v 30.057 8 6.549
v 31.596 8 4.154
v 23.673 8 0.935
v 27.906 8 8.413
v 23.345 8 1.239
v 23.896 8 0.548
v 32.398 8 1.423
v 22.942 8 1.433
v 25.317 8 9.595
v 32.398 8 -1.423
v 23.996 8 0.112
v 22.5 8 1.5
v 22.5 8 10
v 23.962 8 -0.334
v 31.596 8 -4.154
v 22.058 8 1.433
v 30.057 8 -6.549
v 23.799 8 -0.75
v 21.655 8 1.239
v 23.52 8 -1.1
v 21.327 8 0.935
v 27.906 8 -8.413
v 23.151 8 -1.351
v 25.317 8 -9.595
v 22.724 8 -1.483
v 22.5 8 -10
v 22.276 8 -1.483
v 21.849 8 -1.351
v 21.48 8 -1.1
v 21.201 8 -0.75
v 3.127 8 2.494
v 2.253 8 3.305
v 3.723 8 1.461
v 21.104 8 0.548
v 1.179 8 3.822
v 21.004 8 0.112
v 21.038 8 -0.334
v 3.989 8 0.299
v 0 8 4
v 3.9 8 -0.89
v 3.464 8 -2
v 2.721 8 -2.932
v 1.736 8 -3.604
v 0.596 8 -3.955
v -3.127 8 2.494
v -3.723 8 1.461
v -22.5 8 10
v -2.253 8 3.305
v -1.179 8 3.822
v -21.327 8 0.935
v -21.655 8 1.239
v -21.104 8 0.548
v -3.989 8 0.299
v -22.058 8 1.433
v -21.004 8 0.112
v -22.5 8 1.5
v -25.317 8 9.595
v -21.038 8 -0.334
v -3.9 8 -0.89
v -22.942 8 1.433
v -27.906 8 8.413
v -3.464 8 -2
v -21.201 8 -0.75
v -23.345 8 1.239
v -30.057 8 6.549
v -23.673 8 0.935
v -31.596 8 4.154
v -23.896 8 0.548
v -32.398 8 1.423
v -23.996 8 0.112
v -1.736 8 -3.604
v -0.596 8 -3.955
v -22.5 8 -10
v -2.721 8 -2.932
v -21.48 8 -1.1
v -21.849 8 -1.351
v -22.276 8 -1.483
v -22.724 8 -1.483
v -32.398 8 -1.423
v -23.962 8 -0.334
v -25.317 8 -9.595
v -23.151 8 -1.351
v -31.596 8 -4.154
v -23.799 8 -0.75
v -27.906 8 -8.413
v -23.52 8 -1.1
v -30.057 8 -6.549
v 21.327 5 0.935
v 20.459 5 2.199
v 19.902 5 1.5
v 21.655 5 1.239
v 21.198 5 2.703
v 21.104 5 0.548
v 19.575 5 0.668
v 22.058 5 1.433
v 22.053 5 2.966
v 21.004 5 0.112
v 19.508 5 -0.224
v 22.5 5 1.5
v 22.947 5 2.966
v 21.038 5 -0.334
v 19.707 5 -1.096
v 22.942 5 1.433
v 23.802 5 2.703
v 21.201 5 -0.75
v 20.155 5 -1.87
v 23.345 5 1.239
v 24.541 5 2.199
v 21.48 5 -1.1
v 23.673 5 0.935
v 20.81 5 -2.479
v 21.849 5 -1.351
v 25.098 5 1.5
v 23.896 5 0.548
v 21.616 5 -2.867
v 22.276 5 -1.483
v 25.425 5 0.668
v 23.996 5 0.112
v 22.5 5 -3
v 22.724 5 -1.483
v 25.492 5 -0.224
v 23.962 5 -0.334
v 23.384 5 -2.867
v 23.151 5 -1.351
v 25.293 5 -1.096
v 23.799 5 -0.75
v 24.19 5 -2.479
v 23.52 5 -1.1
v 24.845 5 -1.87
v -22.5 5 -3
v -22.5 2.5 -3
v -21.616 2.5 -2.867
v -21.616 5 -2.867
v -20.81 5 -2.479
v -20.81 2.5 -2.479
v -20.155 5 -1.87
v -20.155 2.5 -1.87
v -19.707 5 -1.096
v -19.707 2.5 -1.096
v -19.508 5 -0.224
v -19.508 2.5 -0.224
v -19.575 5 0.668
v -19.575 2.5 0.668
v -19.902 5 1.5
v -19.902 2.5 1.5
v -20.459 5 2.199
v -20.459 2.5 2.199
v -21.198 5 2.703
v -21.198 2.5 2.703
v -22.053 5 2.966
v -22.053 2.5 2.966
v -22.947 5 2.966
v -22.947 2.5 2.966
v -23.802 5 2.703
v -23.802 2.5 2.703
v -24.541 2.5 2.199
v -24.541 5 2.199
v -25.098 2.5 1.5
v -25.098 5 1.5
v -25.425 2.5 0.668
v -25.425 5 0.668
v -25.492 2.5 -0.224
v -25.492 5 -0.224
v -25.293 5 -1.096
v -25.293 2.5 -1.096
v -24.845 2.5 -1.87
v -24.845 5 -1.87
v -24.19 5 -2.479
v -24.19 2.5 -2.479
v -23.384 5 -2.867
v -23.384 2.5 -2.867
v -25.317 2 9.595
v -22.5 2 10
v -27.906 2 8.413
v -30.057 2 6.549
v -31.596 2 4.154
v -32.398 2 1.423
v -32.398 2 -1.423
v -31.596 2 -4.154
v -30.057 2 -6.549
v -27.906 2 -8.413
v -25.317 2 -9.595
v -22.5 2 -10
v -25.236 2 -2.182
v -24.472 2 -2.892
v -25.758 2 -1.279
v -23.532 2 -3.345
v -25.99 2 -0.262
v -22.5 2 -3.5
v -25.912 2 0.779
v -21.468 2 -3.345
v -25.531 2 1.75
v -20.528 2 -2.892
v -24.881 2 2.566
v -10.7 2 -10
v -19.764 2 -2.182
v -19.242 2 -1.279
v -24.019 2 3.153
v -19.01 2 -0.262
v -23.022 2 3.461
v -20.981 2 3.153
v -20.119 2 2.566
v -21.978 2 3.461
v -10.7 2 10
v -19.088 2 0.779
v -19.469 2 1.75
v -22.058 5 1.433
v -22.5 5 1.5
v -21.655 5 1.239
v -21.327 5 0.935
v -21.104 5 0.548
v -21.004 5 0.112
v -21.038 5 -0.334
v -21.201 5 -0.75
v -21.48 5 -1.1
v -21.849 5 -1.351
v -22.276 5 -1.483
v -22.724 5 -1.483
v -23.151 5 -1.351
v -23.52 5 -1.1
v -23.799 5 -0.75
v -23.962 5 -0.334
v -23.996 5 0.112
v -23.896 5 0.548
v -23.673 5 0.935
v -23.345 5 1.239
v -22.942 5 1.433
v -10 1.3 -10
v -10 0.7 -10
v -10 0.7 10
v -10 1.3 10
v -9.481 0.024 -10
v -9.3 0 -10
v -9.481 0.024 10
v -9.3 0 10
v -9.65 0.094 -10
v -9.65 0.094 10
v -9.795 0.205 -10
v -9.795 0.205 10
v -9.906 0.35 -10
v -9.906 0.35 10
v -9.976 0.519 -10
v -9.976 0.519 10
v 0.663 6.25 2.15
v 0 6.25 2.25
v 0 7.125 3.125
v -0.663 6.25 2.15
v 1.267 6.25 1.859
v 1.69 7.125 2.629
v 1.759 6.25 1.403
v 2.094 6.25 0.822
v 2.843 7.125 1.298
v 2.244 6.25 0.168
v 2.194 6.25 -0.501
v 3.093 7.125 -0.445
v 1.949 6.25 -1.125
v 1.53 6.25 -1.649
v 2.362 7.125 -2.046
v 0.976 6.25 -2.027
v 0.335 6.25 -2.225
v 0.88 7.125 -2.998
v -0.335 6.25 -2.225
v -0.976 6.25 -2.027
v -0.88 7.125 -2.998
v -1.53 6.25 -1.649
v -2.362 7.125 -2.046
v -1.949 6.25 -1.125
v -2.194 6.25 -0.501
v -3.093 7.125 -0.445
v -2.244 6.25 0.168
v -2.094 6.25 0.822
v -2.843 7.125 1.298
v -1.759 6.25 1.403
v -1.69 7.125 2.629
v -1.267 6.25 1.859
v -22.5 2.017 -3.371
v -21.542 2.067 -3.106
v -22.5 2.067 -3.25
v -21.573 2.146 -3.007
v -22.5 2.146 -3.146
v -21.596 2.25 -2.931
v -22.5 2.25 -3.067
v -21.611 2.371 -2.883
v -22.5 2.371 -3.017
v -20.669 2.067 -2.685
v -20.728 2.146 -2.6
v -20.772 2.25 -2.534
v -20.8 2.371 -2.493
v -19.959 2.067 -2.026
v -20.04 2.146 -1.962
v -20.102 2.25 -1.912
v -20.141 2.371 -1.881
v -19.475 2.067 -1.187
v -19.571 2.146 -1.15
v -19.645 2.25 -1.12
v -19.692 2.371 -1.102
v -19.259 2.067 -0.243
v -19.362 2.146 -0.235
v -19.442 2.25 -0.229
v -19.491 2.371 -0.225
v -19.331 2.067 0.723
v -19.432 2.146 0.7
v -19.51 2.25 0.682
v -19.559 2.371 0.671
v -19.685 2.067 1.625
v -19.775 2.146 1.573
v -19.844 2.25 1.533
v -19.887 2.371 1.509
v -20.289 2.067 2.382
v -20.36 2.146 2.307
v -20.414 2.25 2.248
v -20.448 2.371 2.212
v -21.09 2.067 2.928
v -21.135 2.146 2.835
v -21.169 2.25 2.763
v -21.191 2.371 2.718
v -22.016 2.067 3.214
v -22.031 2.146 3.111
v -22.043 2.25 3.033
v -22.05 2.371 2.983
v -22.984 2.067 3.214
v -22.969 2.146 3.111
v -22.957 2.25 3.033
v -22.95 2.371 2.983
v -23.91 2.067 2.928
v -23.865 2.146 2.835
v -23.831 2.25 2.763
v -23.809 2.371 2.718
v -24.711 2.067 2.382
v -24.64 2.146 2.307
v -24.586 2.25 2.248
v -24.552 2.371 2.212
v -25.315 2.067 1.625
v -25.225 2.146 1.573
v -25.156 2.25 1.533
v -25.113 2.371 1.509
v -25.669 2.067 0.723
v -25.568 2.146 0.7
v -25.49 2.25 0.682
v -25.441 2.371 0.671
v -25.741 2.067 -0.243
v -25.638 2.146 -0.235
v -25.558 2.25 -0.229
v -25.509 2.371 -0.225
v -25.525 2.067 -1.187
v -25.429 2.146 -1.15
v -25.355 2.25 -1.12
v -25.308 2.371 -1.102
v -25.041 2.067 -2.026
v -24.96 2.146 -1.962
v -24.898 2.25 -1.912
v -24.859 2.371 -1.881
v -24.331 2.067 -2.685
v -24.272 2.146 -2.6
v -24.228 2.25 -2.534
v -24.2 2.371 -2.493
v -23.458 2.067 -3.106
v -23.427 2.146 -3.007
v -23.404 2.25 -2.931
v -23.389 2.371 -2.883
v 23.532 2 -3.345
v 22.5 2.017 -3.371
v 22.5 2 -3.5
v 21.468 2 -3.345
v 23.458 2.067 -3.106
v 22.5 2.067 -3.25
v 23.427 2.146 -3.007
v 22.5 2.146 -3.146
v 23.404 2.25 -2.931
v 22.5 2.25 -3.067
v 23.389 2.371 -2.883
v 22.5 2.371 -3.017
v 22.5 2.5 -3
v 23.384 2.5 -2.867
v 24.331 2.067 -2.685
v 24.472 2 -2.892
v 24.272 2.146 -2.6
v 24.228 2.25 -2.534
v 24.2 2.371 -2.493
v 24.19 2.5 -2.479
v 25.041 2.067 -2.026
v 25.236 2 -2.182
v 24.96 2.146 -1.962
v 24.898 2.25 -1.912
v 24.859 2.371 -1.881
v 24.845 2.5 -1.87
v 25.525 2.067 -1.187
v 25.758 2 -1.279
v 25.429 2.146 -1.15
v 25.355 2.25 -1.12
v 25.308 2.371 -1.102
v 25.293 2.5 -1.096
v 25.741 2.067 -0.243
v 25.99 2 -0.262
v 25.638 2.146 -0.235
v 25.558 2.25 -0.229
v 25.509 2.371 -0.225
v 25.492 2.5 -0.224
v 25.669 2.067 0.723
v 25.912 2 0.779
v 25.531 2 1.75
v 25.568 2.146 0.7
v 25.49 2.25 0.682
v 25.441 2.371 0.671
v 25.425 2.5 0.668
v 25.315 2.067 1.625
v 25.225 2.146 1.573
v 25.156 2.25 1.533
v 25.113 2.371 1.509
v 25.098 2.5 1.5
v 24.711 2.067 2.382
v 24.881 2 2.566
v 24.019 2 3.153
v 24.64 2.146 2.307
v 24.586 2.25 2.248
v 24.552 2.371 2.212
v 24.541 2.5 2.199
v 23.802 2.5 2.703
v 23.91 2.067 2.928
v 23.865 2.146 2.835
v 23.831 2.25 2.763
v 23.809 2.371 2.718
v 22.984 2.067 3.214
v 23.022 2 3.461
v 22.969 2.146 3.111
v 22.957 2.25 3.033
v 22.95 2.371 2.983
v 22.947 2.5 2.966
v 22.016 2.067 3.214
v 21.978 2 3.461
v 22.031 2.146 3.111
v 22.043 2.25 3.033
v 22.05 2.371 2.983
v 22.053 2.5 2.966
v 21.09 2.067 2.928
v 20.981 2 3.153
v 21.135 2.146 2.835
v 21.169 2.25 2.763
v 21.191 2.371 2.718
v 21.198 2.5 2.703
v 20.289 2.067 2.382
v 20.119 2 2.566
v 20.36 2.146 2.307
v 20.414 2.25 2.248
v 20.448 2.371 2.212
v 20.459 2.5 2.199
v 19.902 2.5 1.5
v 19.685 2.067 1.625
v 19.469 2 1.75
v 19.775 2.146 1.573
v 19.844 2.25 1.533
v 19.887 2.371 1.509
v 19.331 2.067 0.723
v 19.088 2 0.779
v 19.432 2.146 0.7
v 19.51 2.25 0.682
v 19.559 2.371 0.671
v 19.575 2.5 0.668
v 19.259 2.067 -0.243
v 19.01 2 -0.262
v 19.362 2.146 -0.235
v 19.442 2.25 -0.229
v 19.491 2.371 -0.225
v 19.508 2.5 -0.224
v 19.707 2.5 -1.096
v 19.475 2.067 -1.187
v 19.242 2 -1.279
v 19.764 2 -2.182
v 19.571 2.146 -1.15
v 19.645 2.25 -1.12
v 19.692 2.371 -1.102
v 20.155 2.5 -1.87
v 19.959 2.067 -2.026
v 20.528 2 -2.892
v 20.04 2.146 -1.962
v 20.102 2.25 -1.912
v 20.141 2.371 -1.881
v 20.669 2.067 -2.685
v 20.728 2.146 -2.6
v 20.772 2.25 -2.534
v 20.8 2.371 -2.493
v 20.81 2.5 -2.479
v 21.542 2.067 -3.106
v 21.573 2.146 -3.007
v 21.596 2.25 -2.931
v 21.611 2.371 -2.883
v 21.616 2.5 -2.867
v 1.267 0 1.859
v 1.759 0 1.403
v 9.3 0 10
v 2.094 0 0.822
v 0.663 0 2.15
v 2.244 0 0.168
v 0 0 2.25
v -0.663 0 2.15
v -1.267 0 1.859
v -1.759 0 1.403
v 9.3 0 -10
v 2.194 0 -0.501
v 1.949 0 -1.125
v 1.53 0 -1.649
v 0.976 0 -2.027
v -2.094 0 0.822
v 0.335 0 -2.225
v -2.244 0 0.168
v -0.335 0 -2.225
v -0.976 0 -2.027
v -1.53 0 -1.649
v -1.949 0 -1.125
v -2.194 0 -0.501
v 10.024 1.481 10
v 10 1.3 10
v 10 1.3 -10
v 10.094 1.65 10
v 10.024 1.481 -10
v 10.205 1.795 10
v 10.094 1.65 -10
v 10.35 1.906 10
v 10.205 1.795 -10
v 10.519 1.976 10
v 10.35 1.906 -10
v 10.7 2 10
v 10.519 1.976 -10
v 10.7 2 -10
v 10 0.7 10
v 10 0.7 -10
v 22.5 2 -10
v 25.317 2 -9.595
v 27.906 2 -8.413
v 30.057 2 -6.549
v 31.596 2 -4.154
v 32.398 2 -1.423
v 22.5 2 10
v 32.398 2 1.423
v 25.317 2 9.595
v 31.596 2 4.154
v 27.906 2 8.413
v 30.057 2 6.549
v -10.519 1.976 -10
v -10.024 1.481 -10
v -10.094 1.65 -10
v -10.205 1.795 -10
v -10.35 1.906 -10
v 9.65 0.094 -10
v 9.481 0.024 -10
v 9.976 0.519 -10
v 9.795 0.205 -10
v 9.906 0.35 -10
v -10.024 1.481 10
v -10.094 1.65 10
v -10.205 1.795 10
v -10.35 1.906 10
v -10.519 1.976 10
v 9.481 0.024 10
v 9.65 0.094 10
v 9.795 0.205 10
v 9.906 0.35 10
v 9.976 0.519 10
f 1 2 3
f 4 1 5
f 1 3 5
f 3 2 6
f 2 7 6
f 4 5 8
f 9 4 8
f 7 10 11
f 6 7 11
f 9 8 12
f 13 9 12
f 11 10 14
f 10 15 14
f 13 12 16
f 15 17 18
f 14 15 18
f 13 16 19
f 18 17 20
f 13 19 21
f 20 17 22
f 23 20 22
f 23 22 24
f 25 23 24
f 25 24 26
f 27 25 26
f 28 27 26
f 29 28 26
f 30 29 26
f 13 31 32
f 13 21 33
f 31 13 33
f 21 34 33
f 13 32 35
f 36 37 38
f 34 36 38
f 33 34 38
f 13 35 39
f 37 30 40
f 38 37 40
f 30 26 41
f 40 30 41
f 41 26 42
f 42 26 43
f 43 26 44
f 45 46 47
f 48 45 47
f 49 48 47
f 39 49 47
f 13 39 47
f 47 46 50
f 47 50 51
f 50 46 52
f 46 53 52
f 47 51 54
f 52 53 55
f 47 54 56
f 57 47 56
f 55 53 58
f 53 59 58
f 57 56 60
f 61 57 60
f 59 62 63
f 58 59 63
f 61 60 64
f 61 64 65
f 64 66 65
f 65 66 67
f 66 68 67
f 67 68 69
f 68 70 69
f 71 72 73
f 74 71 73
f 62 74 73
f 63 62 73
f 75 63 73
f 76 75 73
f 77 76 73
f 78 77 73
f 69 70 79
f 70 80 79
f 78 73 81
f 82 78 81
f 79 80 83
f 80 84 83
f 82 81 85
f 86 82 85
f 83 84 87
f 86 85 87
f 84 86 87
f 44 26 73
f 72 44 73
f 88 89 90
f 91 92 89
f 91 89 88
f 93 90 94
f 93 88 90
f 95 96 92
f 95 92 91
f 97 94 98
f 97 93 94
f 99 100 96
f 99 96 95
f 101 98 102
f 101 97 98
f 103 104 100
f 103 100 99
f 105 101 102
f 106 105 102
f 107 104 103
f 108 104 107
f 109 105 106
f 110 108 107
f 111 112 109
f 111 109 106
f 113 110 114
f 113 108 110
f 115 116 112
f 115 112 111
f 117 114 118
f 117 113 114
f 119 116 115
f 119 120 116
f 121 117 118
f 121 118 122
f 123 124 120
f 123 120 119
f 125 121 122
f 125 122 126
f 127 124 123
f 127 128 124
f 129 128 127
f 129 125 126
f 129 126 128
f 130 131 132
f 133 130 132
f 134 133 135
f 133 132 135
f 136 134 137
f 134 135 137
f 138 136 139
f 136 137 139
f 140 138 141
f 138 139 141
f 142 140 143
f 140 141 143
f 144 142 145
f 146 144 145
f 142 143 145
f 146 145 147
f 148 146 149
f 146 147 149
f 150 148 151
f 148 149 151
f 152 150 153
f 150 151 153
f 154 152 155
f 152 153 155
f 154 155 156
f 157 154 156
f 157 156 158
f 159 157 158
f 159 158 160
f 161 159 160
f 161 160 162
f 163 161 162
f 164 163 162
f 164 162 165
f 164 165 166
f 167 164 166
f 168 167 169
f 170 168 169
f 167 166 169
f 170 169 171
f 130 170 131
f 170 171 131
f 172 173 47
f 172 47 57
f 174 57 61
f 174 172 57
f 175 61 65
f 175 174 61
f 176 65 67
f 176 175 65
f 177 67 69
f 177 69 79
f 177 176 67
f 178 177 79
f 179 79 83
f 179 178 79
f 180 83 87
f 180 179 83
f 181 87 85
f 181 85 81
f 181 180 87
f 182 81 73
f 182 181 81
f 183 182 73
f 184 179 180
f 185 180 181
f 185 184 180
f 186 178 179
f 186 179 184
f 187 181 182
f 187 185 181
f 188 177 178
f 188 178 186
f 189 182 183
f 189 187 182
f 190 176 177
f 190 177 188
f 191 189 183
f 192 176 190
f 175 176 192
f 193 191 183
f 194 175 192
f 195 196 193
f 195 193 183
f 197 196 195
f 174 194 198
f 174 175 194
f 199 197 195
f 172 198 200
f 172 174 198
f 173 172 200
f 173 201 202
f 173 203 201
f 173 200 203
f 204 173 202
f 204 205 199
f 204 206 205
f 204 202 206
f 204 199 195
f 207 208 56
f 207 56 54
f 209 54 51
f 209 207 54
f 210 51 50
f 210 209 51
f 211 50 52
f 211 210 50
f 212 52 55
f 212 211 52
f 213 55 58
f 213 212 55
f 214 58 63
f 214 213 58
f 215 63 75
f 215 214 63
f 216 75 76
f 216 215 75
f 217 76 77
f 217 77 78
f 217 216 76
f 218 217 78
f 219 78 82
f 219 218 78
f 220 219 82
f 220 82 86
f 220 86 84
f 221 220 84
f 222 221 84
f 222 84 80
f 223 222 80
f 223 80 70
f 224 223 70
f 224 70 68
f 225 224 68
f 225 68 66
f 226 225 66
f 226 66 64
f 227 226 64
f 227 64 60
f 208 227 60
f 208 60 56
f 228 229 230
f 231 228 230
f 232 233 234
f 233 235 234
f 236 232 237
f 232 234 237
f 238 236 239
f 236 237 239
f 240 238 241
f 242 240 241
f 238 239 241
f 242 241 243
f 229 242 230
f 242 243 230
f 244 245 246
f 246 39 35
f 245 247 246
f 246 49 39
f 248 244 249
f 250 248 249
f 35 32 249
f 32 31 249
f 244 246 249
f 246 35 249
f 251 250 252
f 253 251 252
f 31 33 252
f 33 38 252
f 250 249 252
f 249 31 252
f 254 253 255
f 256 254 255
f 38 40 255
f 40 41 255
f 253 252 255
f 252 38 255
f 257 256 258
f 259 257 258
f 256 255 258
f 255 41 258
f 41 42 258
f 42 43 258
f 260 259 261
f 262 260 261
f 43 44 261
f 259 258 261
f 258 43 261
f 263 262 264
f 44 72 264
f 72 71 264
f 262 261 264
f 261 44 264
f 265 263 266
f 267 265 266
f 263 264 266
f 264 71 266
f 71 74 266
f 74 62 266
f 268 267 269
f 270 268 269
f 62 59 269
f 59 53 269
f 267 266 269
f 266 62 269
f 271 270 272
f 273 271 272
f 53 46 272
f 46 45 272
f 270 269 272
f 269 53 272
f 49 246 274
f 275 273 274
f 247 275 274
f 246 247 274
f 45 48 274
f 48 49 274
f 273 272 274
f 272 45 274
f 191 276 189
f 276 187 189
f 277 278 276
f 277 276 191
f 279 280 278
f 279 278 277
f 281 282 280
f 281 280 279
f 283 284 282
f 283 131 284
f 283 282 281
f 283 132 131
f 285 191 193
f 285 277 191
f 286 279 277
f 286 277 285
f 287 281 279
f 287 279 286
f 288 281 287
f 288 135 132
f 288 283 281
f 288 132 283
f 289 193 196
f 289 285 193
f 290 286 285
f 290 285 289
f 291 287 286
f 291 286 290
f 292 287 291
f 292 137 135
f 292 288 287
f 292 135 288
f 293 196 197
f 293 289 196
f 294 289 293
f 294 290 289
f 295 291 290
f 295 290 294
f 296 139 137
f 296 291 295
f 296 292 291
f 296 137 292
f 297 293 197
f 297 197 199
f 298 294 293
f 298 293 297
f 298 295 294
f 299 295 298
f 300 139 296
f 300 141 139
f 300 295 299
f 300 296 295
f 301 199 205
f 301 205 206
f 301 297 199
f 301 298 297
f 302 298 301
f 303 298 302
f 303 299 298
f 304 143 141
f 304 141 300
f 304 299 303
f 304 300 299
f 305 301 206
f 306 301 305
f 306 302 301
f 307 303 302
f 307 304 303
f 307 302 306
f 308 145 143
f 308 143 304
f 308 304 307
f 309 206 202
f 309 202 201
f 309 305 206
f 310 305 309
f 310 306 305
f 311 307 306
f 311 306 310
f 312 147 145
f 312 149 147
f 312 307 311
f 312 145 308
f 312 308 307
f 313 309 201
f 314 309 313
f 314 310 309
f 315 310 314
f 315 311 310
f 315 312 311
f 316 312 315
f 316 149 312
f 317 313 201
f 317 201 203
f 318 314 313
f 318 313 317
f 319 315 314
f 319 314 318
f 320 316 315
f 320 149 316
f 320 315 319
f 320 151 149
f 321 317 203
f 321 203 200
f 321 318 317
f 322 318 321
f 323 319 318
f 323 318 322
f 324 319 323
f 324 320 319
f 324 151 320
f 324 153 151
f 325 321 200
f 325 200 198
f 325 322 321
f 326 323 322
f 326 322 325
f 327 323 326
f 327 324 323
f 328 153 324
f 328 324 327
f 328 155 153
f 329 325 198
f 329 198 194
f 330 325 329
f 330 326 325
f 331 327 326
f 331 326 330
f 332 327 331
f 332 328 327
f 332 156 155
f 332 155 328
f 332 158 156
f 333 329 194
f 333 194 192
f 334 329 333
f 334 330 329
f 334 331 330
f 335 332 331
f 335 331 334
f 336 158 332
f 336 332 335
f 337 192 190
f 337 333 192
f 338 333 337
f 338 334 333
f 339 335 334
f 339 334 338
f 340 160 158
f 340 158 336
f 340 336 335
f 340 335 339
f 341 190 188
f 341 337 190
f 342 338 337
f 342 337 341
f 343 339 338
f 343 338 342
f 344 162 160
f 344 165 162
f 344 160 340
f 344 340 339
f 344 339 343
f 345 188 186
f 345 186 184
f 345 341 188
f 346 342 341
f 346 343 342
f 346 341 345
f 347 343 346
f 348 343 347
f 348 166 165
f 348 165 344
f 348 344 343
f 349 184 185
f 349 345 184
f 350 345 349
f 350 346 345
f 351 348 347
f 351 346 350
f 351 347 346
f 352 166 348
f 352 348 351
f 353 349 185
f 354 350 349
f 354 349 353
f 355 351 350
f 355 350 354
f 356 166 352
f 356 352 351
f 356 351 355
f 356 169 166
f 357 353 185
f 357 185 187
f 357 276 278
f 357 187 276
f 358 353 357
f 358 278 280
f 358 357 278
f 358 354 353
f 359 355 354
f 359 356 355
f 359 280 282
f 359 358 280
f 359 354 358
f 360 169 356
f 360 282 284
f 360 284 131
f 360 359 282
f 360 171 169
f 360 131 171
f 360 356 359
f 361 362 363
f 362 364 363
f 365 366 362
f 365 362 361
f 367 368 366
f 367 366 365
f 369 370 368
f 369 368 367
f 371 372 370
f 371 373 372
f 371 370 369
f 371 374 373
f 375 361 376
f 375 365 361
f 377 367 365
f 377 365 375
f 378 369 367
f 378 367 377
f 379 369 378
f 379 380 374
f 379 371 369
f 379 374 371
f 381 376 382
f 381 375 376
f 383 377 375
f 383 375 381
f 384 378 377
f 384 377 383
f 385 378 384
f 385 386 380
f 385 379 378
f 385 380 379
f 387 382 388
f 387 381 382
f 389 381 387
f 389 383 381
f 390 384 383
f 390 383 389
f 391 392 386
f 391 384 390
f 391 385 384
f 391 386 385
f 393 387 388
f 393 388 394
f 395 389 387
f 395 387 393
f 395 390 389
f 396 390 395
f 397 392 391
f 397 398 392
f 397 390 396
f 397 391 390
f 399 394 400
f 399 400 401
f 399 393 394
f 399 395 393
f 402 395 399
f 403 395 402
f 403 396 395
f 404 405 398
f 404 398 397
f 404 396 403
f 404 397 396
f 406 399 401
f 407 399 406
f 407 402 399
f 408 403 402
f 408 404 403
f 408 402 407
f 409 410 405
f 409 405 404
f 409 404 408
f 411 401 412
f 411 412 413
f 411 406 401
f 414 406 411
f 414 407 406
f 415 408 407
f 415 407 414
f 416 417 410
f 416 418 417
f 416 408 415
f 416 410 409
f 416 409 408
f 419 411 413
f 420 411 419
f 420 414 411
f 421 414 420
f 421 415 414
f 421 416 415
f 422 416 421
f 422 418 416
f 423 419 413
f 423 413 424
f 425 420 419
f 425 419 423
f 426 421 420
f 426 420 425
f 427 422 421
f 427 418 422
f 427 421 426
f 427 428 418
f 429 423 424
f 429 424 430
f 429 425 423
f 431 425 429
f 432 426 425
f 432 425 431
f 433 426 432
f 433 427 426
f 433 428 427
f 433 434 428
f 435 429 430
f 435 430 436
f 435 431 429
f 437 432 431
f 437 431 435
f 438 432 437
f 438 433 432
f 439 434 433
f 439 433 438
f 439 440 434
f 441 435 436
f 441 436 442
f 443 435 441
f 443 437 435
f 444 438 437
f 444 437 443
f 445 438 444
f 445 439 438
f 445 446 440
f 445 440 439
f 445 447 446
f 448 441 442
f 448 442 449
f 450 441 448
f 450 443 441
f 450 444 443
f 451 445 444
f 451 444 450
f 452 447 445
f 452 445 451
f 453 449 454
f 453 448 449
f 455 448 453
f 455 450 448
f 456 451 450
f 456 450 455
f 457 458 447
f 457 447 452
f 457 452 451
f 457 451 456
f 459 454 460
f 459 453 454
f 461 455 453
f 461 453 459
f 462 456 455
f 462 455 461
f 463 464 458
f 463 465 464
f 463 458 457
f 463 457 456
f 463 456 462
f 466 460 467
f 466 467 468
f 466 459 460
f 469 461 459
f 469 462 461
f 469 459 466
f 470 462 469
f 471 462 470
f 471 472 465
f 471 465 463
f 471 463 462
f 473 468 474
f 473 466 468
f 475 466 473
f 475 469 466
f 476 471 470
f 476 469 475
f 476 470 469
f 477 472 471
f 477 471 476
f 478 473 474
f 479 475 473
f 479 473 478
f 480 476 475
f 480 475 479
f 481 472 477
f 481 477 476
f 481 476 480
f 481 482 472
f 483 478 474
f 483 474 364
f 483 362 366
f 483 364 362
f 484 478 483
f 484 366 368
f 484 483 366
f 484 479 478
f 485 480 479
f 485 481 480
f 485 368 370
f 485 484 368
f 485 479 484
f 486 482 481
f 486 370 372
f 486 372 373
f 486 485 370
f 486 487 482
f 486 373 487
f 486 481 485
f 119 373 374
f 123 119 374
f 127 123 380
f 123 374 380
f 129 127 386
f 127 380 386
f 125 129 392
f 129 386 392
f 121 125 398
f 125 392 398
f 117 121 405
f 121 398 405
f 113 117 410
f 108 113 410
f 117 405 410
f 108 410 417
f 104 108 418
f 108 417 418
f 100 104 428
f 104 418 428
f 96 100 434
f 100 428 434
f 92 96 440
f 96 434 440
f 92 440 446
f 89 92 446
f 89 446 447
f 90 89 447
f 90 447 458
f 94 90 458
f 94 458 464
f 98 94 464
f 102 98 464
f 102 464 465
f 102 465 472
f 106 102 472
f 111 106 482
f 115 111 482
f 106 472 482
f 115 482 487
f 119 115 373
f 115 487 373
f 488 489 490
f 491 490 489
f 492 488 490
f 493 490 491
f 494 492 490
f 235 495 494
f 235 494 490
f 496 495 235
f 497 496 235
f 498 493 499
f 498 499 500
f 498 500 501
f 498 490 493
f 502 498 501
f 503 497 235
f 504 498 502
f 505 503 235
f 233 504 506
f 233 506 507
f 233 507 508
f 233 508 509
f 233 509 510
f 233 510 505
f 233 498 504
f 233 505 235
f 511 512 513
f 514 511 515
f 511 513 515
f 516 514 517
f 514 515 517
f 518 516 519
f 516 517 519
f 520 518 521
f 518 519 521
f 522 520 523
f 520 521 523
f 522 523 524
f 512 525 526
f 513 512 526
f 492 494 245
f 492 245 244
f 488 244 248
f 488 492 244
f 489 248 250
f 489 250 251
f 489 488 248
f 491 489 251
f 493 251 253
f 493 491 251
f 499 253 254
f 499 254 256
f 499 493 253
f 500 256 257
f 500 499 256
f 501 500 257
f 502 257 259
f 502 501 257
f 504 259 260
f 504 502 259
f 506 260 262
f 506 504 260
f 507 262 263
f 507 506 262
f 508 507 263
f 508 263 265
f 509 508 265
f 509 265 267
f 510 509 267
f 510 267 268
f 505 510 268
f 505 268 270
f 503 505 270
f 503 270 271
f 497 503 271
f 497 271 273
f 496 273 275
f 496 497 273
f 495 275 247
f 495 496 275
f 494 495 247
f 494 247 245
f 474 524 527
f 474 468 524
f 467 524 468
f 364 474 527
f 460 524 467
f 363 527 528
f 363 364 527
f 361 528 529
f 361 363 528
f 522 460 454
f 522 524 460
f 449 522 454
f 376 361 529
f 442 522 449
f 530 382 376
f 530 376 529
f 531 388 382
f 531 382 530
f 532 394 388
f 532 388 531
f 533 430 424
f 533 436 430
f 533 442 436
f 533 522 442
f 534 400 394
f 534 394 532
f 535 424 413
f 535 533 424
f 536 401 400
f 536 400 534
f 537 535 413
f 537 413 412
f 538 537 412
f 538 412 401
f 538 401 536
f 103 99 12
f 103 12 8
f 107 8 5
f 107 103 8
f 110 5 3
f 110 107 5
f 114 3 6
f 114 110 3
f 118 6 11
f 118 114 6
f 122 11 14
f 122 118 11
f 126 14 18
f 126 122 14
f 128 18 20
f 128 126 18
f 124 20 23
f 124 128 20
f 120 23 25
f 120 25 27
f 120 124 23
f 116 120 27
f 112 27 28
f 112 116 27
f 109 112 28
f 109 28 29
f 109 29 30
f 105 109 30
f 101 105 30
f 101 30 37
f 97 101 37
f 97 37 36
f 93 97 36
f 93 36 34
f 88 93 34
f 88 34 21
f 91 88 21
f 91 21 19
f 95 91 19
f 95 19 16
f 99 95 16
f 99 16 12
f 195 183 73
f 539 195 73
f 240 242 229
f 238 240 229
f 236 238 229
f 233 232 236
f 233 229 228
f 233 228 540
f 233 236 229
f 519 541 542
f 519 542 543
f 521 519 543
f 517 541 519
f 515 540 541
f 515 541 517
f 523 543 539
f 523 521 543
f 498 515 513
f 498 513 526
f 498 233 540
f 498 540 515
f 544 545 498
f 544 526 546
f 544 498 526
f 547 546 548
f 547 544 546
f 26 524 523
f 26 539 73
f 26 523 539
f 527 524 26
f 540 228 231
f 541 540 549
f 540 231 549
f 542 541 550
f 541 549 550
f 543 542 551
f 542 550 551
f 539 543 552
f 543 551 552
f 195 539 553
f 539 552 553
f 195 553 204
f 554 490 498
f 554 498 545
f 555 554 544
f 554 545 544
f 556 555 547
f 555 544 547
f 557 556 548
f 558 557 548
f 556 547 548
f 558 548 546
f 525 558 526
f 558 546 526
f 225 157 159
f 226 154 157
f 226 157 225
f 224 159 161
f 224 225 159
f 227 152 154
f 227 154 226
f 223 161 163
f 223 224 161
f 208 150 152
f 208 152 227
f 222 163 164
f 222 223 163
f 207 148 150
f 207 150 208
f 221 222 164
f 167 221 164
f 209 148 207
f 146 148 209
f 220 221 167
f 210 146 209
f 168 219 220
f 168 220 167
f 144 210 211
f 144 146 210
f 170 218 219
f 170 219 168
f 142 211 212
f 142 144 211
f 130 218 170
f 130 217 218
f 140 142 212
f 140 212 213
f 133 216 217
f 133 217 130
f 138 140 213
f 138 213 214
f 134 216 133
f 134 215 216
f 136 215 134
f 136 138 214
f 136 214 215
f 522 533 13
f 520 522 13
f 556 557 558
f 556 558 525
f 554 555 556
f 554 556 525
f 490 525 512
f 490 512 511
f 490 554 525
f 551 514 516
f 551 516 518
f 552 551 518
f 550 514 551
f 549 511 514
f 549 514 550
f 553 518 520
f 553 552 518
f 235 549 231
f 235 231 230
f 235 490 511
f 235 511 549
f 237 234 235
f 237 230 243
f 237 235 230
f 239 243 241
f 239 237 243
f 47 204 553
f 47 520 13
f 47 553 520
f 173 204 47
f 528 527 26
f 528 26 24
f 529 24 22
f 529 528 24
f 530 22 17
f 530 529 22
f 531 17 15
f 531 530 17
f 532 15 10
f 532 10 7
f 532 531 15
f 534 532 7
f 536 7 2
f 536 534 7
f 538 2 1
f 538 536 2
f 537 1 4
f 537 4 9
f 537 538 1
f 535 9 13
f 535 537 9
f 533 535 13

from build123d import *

# Parameters (mm, degrees)
SKETCH1_R           = 1.5
SKETCH1_R_2         = 2.25
BOSS_EXTRUDE1_DEPTH = 8
CHAMFER1_SIZE       = 1.75
CUT_EXTRUDE1_DEPTH  = 2
SKETCH4_R           = 3
CUT_EXTRUDE2_DEPTH  = 3
FILLET1_R           = 0.7
FILLET2_R           = 0.5


with BuildPart() as part:
    # Sketch1 → Boss-Extrude1 (new body)
    with BuildSketch(Plane(origin=(0, 0, 0), x_dir=(1, 0, 0), z_dir=(0, 1, 0))):
        with BuildLine():
            Line((-22.5, 10), (22.5, 10))
            ThreePointArc((22.5, 10), (32.5, 0), (22.5, -10))
            Line((22.5, -10), (-22.5, -10))
            ThreePointArc((-22.5, -10), (-32.5, 0), (-22.5, 10))
        make_face()
        with Locations(Location((-22.5, 0, 0), (0, 0, 270))):
            Circle(SKETCH1_R, mode=Mode.SUBTRACT)
        with Locations(Location((22.5, 0, 0), (0, 0, 270))):
            Circle(SKETCH1_R, mode=Mode.SUBTRACT)
        with Locations(Location((0, 0, 0), (0, 0, 270))):
            Circle(SKETCH1_R_2, mode=Mode.SUBTRACT)
    extrude(amount=BOSS_EXTRUDE1_DEPTH)

    # Chamfer1
    chamfer1_edges = [part.edges().sort_by_distance(p)[0] for p in [
        (0, 8, -2.25),
    ]]
    chamfer(chamfer1_edges, length=CHAMFER1_SIZE)

    # Sketch3 → Cut-Extrude1 (cut)
    with BuildSketch(Plane.XZ):
        with BuildLine():
            Line((-10, 10), (-22.5, 10))
            ThreePointArc((-22.5, 10), (-32.5, 0), (-22.5, -10))
            Line((-22.5, -10), (-10, -10))
            Line((-10, -10), (-10, 10))
        make_face()
        with BuildLine():
            Line((22.5, 10), (10, 10))
            Line((10, 10), (10, -10))
            Line((10, -10), (22.5, -10))
            ThreePointArc((22.5, -10), (32.5, 0), (22.5, 10))
        make_face()
    extrude(amount=-CUT_EXTRUDE1_DEPTH, mode=Mode.SUBTRACT)

    # Sketch4 → Cut-Extrude2 (cut)
    with BuildSketch(Plane.XZ.offset(-2)):
        with Locations(Location((-22.5, 0, 0), (0, 0, 270))):
            Circle(SKETCH4_R)
        with Locations(Location((22.5, 0, 0), (0, 0, 270))):
            Circle(SKETCH4_R)
    extrude(amount=-CUT_EXTRUDE2_DEPTH, mode=Mode.SUBTRACT)

    # Fillet1
    fillet1_edges = [part.edges().sort_by_distance(p)[0] for p in [
        (-10, 0, 0),
        (-10, 2, 0),
        (10, 0, 0),
        (10, 2, 0),
    ]]
    fillet(fillet1_edges, radius=FILLET1_R)

    # Fillet2
    fillet2_edges = [part.edges().sort_by_distance(p)[0] for p in [
        (-22.5, 2, 3),
        (22.5, 2, 3),
    ]]
    fillet(fillet2_edges, radius=FILLET2_R)


solid = part.part
